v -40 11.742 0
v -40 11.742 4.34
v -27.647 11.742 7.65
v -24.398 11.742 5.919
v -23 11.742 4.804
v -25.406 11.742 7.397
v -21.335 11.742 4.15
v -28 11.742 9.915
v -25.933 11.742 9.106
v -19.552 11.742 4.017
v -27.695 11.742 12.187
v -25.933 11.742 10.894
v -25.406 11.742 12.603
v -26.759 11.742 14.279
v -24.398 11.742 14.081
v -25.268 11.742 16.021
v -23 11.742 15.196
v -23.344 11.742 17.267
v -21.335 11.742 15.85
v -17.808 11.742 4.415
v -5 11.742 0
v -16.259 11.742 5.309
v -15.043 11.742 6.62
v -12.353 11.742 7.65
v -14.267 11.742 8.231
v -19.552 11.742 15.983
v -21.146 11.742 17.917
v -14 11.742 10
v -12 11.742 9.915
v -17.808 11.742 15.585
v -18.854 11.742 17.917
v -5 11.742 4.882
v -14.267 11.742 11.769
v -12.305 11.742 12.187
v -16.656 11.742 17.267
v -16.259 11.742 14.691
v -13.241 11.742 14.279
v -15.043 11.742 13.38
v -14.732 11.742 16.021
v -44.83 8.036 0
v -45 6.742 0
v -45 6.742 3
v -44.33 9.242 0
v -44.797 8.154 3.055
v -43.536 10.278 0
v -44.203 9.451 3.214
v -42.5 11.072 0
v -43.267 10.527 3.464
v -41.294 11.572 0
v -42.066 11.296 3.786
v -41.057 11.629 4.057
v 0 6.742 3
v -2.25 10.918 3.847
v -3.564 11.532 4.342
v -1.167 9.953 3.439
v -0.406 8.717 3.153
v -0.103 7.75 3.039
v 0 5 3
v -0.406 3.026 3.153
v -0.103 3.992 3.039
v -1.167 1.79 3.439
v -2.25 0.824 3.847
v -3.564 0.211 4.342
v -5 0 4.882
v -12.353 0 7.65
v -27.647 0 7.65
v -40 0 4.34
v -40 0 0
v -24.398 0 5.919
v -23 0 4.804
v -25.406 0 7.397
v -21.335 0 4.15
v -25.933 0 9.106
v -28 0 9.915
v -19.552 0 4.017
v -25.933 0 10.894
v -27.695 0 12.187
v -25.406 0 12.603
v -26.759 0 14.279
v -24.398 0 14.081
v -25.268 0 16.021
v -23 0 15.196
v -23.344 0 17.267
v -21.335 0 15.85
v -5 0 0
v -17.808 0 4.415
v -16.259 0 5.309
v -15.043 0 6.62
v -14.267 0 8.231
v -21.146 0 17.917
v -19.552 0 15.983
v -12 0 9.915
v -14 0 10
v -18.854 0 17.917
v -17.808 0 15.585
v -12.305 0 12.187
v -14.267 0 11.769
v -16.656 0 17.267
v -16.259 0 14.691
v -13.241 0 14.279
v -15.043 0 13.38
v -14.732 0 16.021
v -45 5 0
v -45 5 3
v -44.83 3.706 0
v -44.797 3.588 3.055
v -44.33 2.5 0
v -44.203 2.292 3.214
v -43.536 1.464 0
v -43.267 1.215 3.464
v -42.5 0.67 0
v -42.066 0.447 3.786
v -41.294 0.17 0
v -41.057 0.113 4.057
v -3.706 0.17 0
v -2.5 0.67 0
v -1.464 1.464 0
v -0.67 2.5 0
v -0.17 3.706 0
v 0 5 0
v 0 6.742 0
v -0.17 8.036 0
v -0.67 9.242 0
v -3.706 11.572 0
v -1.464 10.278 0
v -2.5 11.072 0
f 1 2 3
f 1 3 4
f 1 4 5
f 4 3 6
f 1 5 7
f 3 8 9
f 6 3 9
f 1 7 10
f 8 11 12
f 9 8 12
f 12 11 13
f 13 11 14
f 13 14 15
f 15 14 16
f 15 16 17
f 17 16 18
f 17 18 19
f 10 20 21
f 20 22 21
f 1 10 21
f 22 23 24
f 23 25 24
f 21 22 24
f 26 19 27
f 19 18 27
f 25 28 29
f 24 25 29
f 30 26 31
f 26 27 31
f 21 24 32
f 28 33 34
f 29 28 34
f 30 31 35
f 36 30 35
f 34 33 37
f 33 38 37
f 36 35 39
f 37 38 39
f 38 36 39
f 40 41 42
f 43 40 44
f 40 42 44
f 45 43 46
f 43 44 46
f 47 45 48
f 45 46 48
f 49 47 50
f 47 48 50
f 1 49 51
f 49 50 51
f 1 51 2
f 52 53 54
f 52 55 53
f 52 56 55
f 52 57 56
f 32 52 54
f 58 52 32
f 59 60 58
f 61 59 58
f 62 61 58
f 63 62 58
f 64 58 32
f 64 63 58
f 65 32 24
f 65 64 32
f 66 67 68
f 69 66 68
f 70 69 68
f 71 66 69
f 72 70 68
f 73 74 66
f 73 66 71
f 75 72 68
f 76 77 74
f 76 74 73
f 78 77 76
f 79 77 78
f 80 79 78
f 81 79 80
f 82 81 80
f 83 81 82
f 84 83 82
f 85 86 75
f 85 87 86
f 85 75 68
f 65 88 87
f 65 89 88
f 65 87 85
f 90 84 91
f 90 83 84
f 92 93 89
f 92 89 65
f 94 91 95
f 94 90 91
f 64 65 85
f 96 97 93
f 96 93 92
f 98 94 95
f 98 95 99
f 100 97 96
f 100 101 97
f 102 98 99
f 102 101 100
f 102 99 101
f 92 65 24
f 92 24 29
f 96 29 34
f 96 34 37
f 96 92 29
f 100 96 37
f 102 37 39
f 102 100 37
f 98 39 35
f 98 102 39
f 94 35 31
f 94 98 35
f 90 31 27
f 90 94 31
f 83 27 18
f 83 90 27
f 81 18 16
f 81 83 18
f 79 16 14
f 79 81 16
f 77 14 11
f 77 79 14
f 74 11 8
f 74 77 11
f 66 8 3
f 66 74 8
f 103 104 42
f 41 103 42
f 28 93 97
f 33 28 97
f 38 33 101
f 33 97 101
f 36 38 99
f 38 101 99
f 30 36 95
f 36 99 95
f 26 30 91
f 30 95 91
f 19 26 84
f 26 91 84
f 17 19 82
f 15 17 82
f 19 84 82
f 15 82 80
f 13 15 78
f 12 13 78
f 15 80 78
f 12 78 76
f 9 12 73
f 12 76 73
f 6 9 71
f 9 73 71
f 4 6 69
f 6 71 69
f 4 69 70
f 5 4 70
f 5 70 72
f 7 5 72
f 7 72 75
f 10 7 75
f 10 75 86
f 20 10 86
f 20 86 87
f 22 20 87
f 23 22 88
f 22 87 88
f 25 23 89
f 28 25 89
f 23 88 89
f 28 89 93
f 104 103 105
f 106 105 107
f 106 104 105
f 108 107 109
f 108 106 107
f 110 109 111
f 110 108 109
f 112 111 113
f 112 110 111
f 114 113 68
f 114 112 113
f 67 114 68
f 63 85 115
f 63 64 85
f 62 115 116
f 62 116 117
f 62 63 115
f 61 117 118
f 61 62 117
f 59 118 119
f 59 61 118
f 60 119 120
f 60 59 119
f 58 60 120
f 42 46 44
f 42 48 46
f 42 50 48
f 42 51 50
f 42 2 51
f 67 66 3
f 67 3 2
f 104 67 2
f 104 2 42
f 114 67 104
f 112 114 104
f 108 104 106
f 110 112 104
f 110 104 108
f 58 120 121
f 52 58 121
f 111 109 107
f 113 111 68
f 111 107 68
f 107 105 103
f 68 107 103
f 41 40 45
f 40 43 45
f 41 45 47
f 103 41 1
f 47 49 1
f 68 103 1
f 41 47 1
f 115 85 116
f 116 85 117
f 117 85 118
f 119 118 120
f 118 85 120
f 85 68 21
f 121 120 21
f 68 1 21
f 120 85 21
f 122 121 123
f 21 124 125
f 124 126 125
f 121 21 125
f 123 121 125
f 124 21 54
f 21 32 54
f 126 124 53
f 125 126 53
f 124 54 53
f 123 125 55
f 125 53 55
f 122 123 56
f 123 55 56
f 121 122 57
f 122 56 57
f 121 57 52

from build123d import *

# Parameters (mm, degrees)
F0_W     = 45
F0_H     = 11.742345
F1_DEPTH = 3
F2_R     = 6
F3_DEPTH = 11.742345
F4_R     = 5


with BuildPart() as f1:
    # F0 (on Top) → F1 (new body)
    with BuildSketch(Plane.XY):
        with Locations((-22.5, 5.8711725)):
            Rectangle(F0_W, F0_H)
    extrude(amount=F1_DEPTH)

    # F2 (on Front) → F3 (join)
    with BuildSketch(Plane.XZ):
        with BuildLine():
            Line((-45, 3), (0, 3))
            Line((0, 3), (-12.3530250157, 7.6497290392))
            ThreePointArc((-12.3530250157, 7.6497290392), (-20, 18), (-27.6469749843, 7.6497290392))
            Line((-27.6469749843, 7.6497290392), (-45, 3))
        make_face()
        with Locations((-20, 10)):
            Circle(F2_R, mode=Mode.SUBTRACT)
    extrude(amount=-F3_DEPTH)

    # F4
    f4_edges = [f1.edges().sort_by_distance(p)[0] for p in [
        (-45, 0, 1.5),
        (0, 0, 1.5),
        (0, 11.742345, 1.5),
        (-45, 11.742345, 1.5),
    ]]
    fillet(f4_edges, radius=F4_R)


solid = f1.part
